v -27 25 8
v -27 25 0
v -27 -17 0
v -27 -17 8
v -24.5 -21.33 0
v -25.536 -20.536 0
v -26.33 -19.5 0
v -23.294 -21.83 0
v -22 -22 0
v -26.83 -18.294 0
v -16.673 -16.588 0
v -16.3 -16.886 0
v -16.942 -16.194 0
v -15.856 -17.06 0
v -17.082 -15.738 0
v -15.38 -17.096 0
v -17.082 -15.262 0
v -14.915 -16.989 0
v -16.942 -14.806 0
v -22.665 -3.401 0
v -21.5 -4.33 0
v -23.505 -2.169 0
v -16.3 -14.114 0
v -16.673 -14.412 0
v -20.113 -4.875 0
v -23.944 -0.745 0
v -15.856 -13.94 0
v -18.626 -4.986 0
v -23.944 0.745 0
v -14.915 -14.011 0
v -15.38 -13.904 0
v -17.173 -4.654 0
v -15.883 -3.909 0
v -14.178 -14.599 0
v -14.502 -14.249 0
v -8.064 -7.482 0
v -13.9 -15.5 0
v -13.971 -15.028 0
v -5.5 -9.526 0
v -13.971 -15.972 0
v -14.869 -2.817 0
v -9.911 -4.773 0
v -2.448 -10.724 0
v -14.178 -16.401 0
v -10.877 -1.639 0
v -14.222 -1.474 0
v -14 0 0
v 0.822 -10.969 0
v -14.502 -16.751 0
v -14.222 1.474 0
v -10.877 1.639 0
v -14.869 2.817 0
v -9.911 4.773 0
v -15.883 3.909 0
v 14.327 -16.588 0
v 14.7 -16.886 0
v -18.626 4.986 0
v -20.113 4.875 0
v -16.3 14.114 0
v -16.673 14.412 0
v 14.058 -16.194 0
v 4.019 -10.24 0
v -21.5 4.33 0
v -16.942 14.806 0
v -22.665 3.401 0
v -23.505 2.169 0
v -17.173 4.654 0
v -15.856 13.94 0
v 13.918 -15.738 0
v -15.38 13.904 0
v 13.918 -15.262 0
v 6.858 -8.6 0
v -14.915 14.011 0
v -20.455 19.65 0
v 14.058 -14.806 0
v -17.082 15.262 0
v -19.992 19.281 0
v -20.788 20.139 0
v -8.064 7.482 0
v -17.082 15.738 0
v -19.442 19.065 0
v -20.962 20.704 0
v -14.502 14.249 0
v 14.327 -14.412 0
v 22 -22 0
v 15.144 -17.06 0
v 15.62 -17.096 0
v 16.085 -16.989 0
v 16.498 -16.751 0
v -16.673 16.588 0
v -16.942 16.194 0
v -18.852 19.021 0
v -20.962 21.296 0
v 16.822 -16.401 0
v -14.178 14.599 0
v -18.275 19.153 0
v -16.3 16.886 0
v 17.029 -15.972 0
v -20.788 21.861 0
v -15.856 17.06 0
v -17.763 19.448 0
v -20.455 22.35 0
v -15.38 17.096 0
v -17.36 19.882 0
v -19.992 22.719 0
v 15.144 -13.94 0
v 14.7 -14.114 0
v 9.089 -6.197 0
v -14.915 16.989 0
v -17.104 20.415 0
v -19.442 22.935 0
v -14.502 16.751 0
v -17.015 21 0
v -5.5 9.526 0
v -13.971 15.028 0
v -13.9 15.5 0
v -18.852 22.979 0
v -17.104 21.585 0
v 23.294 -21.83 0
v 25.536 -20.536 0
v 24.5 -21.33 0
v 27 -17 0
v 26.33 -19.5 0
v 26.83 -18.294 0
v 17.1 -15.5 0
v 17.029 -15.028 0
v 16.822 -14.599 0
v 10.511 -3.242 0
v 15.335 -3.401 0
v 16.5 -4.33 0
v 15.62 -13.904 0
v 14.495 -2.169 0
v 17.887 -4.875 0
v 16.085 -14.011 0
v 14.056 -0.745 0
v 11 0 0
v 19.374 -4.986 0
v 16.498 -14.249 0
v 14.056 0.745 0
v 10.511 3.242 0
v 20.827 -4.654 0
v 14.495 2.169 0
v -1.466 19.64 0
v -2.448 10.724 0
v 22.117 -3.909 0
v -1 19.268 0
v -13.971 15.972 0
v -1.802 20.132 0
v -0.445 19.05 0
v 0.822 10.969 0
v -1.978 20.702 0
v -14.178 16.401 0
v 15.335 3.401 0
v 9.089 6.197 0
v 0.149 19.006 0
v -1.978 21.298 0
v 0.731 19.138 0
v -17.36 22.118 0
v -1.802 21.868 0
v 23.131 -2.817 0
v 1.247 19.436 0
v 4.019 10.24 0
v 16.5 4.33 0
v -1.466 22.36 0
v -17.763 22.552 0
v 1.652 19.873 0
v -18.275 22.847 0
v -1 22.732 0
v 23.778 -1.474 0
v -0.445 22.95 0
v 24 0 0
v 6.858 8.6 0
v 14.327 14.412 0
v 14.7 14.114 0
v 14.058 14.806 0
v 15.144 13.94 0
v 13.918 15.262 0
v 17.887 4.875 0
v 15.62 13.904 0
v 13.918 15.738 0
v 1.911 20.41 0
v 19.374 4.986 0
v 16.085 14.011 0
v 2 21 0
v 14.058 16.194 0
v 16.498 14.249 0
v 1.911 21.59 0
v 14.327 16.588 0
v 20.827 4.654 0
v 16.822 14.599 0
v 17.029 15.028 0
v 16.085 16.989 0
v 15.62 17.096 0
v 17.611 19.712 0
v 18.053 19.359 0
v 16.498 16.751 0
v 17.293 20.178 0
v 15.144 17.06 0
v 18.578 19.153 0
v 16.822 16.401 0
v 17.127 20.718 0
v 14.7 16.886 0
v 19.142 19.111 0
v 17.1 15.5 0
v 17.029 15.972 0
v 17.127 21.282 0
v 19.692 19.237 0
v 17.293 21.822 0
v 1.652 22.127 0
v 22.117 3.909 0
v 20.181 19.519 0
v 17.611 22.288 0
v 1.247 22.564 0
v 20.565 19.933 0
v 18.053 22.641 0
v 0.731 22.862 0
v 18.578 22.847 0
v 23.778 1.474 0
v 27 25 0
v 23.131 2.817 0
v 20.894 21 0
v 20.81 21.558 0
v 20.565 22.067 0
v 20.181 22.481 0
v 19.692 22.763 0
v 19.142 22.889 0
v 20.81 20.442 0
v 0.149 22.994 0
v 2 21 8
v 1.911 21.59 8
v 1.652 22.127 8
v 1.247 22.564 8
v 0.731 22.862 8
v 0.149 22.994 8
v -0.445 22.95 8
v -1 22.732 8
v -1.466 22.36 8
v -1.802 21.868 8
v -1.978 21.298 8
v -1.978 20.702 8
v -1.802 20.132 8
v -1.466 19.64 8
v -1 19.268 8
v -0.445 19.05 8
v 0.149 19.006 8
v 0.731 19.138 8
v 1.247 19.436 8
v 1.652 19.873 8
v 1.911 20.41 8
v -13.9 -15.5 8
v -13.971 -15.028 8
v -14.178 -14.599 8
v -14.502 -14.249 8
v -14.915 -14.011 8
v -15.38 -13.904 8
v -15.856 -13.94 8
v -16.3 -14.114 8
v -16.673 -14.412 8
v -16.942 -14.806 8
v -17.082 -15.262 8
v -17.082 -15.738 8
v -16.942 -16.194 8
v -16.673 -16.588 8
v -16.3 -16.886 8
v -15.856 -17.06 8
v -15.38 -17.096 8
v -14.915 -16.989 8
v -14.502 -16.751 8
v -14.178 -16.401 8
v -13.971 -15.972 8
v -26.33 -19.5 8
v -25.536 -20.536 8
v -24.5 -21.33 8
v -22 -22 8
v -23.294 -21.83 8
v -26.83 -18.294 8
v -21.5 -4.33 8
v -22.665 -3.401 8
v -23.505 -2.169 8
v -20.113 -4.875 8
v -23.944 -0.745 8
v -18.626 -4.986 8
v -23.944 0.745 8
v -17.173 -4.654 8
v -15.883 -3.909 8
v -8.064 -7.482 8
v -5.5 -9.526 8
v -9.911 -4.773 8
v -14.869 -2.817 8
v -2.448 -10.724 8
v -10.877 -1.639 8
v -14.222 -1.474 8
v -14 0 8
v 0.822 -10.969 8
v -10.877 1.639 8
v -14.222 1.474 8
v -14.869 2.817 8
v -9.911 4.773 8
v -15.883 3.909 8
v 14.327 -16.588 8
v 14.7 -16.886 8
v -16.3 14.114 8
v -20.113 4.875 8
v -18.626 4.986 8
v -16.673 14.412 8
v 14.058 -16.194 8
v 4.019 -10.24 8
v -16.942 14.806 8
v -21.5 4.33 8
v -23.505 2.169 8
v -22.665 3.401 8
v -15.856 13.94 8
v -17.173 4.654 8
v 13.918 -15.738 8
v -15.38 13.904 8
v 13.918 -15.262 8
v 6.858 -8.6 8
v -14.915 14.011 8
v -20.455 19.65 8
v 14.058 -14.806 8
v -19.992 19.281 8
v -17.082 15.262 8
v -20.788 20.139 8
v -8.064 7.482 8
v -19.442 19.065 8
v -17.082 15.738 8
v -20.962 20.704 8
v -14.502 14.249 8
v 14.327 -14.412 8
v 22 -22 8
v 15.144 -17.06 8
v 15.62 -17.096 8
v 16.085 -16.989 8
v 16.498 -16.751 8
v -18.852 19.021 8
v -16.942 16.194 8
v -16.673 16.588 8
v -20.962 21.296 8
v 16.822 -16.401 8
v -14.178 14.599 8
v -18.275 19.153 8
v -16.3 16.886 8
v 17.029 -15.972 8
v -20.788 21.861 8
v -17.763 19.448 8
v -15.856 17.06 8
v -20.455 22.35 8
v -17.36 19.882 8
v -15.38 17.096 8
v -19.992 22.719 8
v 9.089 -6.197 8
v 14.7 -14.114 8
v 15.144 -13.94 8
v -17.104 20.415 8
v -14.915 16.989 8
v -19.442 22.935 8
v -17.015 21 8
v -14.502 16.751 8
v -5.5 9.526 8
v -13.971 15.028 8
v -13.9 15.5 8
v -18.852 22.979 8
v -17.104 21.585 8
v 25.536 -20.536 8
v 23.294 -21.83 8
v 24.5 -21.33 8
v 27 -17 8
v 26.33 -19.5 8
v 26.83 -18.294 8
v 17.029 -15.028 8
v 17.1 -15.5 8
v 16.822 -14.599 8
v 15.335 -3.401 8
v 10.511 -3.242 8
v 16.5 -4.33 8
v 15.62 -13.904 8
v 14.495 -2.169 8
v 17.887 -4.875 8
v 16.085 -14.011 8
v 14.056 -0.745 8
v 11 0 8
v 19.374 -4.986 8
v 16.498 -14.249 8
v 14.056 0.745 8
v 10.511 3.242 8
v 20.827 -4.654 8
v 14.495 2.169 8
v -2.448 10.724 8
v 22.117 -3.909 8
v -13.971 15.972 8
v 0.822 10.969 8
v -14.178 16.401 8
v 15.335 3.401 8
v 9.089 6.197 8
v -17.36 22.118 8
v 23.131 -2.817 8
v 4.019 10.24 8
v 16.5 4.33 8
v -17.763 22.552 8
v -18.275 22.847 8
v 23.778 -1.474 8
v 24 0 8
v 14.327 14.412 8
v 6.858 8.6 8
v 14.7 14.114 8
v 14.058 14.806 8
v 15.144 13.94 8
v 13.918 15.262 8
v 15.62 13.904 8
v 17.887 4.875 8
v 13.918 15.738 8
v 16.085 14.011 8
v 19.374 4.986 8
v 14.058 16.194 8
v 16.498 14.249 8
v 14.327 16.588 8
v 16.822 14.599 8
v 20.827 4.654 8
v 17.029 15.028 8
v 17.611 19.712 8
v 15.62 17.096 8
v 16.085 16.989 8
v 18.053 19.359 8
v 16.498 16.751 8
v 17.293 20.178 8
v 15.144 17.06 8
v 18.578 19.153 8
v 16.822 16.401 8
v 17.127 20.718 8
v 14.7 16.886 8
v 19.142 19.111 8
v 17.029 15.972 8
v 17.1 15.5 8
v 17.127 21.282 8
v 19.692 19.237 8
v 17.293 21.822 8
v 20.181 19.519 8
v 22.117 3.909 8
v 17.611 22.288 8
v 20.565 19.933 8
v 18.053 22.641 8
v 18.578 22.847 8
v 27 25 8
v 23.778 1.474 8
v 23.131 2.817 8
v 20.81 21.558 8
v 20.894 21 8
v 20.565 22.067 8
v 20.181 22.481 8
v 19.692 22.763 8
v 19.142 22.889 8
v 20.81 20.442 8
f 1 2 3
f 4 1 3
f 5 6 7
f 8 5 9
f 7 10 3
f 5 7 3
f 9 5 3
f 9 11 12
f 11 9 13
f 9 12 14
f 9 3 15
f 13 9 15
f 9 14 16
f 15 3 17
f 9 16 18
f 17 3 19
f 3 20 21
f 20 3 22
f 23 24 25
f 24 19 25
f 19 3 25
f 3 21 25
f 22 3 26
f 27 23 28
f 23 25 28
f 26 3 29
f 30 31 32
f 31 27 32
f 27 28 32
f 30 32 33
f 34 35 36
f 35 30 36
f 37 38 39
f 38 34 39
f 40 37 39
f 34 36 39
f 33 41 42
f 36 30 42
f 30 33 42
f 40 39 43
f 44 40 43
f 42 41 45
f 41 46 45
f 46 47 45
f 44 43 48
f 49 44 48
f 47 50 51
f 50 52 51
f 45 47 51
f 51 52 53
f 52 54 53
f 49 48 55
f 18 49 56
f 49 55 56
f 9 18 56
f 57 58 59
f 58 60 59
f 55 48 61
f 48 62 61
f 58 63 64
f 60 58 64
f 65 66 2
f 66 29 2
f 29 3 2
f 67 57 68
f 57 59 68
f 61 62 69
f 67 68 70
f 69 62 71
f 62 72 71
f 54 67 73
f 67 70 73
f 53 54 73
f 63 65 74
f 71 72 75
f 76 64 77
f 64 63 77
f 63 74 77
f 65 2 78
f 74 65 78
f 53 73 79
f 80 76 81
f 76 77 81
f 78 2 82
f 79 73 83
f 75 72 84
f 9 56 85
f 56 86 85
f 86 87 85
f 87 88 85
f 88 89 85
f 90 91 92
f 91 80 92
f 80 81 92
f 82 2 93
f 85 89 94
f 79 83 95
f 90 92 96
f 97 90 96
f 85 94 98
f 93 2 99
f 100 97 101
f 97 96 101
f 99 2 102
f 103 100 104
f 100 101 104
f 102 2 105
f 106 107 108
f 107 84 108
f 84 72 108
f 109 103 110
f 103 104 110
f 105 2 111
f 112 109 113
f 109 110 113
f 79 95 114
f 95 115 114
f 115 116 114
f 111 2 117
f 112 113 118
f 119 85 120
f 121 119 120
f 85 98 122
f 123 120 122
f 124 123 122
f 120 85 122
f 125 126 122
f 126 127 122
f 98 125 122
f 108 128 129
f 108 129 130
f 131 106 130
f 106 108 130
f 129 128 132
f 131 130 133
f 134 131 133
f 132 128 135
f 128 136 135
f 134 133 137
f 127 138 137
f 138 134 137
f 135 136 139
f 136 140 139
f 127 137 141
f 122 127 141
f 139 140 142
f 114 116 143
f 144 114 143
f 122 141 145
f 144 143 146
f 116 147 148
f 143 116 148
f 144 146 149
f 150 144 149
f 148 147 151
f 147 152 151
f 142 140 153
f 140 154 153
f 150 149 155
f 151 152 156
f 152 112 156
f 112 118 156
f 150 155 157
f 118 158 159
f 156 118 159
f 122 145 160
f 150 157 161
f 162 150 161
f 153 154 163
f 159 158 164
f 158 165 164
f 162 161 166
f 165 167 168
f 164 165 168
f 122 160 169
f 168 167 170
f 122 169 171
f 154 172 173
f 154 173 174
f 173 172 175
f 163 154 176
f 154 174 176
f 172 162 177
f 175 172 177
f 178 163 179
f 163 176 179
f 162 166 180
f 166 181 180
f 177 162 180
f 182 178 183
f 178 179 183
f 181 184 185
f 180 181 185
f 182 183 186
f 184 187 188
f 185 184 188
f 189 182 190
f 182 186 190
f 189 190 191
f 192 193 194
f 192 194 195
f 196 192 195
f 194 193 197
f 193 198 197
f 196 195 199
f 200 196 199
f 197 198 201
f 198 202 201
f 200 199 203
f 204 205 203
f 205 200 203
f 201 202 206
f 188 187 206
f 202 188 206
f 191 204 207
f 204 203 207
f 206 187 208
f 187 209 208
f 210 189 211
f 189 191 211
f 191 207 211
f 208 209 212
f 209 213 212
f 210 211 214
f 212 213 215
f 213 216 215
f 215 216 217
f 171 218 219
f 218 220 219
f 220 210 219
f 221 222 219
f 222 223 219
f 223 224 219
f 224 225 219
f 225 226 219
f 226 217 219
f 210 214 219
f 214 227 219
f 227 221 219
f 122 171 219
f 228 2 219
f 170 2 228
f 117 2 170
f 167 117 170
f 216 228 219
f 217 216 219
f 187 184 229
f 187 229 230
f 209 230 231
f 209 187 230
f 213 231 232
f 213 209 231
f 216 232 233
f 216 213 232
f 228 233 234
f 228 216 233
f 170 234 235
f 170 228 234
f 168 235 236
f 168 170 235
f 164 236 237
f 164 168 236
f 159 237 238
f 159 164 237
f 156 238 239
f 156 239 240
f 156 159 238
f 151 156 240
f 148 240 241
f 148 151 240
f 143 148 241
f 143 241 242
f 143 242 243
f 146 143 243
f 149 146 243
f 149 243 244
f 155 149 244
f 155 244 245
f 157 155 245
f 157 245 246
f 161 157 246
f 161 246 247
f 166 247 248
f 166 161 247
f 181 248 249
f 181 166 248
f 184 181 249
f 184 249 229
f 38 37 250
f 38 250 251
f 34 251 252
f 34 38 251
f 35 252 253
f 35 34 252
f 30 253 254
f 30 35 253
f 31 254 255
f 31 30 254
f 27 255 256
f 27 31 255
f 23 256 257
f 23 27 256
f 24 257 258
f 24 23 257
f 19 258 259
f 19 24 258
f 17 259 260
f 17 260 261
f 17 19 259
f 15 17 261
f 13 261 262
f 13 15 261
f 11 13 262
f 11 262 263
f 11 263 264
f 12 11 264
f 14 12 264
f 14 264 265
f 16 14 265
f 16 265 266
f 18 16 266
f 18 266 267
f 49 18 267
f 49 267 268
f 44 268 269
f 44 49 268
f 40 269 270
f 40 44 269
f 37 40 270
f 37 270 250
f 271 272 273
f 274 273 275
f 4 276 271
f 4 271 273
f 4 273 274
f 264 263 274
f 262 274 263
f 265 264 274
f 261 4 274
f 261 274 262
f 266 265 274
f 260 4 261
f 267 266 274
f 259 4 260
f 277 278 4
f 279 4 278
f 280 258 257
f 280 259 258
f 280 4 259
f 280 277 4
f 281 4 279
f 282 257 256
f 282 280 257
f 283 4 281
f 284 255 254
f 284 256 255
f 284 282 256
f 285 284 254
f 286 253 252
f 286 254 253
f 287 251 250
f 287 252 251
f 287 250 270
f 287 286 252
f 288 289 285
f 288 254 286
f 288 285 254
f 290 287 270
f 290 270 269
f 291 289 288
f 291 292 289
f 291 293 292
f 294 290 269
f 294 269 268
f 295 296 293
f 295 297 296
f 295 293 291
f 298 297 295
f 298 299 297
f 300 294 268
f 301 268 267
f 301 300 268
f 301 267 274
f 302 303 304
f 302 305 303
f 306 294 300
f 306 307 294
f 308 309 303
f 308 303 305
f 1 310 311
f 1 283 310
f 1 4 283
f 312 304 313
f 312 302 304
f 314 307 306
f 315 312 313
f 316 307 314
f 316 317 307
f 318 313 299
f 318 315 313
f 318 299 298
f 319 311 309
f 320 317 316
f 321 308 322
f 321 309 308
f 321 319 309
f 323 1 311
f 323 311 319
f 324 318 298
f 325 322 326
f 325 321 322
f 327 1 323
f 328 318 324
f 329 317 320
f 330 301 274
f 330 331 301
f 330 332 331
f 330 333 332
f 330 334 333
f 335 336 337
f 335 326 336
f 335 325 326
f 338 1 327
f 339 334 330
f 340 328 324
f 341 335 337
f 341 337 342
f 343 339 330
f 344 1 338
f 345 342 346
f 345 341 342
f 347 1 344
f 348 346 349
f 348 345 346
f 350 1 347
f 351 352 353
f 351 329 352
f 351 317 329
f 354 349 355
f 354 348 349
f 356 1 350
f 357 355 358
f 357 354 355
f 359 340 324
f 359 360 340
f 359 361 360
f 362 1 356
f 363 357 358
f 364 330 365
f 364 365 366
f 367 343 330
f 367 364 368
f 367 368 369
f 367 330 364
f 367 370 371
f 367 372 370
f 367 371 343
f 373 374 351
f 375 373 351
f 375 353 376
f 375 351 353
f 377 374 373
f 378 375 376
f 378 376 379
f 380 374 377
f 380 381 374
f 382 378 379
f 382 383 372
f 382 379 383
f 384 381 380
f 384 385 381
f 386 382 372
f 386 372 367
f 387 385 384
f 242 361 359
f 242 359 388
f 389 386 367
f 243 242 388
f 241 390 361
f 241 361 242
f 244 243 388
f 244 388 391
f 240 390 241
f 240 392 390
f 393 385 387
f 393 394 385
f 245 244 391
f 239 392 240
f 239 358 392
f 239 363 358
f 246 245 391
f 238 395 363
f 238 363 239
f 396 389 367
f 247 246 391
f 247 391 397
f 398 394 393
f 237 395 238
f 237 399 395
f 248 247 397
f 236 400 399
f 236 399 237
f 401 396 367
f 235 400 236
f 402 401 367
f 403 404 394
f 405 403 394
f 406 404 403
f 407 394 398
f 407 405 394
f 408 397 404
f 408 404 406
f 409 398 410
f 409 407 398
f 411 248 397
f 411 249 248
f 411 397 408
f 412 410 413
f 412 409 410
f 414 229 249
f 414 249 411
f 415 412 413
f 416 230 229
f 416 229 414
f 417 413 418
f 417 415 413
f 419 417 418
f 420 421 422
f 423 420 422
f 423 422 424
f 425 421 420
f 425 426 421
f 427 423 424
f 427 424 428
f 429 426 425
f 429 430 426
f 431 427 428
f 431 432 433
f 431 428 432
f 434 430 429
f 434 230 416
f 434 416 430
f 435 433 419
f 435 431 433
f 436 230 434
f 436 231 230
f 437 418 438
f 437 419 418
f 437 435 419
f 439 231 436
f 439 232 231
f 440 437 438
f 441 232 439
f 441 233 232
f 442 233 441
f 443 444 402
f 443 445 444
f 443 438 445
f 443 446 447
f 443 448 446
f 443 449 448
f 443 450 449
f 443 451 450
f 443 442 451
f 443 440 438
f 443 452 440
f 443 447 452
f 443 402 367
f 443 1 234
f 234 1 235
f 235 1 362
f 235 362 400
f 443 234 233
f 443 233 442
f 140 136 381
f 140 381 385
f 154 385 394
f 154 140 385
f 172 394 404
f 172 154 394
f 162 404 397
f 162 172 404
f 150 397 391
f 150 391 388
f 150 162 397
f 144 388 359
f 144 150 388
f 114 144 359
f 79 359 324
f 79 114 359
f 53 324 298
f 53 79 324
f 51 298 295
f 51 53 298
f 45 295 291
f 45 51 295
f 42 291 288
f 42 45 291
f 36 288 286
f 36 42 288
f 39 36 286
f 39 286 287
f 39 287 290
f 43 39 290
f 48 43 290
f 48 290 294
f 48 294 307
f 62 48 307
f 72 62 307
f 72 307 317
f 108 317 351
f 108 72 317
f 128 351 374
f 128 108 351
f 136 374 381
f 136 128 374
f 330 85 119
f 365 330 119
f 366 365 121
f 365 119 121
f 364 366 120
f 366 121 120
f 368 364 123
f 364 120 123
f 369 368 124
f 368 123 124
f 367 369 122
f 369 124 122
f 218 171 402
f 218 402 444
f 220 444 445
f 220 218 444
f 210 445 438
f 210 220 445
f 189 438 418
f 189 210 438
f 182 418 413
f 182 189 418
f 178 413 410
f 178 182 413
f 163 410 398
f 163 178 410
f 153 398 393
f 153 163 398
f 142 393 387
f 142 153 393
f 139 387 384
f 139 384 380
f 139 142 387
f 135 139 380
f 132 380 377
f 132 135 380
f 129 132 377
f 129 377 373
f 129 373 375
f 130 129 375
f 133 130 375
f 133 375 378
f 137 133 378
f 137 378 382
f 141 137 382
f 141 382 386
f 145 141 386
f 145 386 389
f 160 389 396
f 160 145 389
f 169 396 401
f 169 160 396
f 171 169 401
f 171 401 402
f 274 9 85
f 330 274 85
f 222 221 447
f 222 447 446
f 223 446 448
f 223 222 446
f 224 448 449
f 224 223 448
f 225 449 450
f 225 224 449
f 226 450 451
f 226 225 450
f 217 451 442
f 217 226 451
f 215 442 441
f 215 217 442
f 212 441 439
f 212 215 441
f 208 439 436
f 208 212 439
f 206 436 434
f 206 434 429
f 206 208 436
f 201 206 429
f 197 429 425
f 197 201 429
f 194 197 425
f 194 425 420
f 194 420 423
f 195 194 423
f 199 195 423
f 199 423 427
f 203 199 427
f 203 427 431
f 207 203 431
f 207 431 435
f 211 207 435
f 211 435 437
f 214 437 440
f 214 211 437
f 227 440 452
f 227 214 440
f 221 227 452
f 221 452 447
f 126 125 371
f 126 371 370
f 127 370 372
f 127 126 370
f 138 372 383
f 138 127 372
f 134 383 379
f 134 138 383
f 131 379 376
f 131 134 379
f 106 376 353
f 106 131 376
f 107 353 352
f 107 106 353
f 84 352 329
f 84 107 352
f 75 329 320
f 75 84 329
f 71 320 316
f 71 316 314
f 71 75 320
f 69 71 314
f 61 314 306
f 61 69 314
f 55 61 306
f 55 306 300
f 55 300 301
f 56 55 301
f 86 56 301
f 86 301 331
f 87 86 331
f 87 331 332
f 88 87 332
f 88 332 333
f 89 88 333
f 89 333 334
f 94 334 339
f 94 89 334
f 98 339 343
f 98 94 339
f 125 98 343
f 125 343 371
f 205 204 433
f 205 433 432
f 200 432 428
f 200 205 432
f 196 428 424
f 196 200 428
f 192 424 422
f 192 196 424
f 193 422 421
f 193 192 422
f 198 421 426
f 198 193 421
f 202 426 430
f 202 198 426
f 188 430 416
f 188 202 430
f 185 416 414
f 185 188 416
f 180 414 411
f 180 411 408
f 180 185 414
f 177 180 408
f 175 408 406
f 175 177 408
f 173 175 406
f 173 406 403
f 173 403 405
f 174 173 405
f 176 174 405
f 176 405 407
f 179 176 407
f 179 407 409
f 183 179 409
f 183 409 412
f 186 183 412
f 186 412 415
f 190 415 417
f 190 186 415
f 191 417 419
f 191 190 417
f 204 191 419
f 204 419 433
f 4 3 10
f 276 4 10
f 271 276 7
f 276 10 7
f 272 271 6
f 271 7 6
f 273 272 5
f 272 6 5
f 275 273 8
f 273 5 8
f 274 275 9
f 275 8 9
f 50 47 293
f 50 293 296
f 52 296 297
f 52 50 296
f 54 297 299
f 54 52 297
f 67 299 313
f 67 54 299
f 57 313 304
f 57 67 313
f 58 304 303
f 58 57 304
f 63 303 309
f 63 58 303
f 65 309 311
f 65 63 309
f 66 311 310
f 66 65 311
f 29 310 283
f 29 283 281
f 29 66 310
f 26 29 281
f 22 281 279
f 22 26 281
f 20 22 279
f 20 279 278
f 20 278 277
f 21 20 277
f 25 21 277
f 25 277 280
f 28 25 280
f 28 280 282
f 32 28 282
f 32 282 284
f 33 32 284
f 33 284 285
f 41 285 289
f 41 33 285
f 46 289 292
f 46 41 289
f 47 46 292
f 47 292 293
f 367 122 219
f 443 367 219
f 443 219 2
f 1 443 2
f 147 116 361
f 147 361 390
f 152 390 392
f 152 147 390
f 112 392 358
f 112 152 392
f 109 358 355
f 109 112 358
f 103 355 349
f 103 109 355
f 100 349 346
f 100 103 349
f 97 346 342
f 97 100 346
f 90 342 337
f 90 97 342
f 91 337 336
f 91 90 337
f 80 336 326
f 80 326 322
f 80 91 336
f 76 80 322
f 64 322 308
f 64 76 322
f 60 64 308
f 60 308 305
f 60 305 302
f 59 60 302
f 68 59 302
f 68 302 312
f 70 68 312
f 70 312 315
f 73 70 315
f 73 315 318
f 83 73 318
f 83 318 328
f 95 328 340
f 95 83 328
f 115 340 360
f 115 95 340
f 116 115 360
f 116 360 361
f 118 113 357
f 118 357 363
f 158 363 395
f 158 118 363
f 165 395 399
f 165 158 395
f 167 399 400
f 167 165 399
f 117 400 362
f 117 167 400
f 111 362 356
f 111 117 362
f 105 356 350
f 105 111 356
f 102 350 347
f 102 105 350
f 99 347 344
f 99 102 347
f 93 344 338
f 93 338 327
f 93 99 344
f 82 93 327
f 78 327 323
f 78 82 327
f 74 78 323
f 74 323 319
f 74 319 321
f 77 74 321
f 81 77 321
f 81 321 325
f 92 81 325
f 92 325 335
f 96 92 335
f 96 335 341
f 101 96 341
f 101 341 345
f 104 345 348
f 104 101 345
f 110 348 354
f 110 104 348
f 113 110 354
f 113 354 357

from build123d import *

# Parameters (mm, degrees)
SKETCH1_R           = 5
SKETCH1_R_2         = 11
SKETCH1_R_3         = 2
SKETCH1_R_4         = 1.984633097
SKETCH1_R_5         = 1.894356903
SKETCH1_R_6         = 1.6
BOSS_EXTRUDE1_DEPTH = 8


with BuildPart() as part:
    # Sketch1 → Boss-Extrude1 (new body)
    with BuildSketch(Plane.XY):
        with BuildLine():
            Line((-22, -22), (22, -22))
            ThreePointArc((22, -22), (25.535533906, -20.535533906), (27, -17))
            Line((27, -17), (27, 25))
            Line((27, 25), (-27, 25))
            Line((-27, 25), (-27, -17))
            ThreePointArc((-27, -17), (-25.535533906, -20.535533906), (-22, -22))
        make_face()
        with Locations((-19, 0)):
            Circle(SKETCH1_R, mode=Mode.SUBTRACT)
        with Locations((19, 0)):
            Circle(SKETCH1_R, mode=Mode.SUBTRACT)
        Circle(SKETCH1_R_2, mode=Mode.SUBTRACT)
        with Locations((0, 21)):
            Circle(SKETCH1_R_3, mode=Mode.SUBTRACT)
        with Locations((-19, 21)):
            Circle(SKETCH1_R_4, mode=Mode.SUBTRACT)
        with Locations((19, 21)):
            Circle(SKETCH1_R_5, mode=Mode.SUBTRACT)
        with Locations((-15.5, 15.5)):
            Circle(SKETCH1_R_6, mode=Mode.SUBTRACT)
        with Locations((15.5, 15.5)):
            Circle(SKETCH1_R_6, mode=Mode.SUBTRACT)
        with Locations((15.5, -15.5)):
            Circle(SKETCH1_R_6, mode=Mode.SUBTRACT)
        with Locations((-15.5, -15.5)):
            Circle(SKETCH1_R_6, mode=Mode.SUBTRACT)
    extrude(amount=BOSS_EXTRUDE1_DEPTH)


solid = part.part
